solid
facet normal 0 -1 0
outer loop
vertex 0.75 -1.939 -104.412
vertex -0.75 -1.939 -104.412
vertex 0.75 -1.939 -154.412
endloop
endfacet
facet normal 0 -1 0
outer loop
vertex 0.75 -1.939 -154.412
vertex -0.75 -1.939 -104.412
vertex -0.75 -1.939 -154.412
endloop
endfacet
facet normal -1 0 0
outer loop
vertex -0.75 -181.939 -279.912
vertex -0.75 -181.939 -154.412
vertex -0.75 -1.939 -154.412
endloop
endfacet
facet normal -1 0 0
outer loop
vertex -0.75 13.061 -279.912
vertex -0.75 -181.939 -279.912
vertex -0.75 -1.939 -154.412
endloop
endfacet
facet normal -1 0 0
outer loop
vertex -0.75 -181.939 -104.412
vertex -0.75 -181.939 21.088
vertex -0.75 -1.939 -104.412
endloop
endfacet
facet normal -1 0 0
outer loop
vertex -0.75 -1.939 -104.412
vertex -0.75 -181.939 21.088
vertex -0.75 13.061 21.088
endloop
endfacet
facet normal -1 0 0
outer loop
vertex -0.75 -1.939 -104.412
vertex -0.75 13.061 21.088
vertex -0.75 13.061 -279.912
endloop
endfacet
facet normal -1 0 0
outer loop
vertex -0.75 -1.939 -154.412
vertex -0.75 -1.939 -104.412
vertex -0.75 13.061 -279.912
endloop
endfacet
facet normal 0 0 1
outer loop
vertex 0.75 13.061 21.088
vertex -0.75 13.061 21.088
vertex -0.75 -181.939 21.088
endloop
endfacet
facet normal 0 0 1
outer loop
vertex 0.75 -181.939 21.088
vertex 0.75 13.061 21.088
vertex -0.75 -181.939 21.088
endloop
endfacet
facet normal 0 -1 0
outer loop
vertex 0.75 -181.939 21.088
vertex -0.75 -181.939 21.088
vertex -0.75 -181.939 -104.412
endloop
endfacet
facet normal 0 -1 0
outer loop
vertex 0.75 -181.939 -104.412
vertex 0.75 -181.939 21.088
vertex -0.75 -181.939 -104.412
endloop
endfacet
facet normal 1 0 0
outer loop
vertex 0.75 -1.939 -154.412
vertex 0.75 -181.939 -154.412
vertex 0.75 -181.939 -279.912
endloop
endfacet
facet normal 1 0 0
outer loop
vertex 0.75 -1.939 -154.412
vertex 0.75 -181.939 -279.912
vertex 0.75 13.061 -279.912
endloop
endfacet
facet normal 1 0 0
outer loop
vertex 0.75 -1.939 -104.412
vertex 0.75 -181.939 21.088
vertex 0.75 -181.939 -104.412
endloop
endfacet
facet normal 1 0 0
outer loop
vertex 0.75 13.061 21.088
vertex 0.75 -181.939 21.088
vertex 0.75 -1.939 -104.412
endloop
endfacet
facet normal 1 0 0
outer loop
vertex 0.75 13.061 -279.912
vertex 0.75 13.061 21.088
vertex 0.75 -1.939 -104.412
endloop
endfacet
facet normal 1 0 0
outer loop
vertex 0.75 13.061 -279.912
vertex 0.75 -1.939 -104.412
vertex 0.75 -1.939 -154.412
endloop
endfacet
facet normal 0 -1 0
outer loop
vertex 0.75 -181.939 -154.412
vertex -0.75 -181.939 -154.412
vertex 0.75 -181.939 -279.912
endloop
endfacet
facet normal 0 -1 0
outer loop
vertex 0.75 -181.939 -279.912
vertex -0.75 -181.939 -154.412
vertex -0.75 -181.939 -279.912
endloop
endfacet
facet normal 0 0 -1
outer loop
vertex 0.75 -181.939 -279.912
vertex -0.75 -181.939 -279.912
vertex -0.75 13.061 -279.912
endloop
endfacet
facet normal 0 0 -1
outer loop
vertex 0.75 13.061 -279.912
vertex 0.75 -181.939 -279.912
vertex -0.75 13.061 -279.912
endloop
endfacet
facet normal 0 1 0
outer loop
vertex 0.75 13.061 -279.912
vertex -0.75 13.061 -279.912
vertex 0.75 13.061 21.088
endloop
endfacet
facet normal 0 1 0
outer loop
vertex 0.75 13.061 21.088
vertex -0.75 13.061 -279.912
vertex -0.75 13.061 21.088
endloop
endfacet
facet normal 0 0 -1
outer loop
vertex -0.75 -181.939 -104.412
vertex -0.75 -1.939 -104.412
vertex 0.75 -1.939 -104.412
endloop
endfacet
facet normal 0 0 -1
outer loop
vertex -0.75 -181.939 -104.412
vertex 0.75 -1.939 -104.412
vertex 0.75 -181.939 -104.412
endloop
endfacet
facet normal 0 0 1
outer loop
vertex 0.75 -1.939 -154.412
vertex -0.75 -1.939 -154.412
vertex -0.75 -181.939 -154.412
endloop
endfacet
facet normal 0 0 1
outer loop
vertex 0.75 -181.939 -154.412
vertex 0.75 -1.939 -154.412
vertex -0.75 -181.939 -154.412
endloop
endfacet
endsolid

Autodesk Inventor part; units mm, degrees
ref_plane "YZ Plane" through (0, 0, 0) normal (1, 0, 0) x (0, 1, 0)
ref_plane "XZ Plane" through (0, 0, 0) normal (0, 1, 0) x (-1, 0, 0)
ref_plane "XY Plane" through (0, 0, 0) normal (0, 0, 1) x (1, 0, 0)
sketch "Boceto1" plane through (0, 0, 0) normal (1, 0, 0) x (0, 1, 0)
  line L0 (13.0609, 21.0882) -> (-181.9391, 21.0882)
  line L1 (-181.9391, -279.9118) -> (13.0609, -279.9118)
  line L2 (13.0609, -279.9118) -> (13.0609, 21.0882)
  line L3 (-1.9391, -129.4118) -> (-1.9391, -154.4118)
  line L4 (-1.9391, -154.4118) -> (-181.9391, -154.4118)
  line L5 (-1.9391, -129.4118) -> (-1.9391, -104.4118)
  line L6 (-1.9391, -104.4118) -> (-181.9391, -104.4118)
  line L7 (-181.9391, 21.0882) -> (-181.9391, -104.4118)
  line L8 (-181.9391, -154.4118) -> (-181.9391, -279.9118)
  point P0 (0, 0)
  dimension "d0" = 195
  dimension "d1" = 301
  dimension "d3" = 25
  dimension "d4" = 25
extrude "Extrusión1" add sketch "Boceto1" along normal mid plane 1.5
properties part number "panel frontal"
